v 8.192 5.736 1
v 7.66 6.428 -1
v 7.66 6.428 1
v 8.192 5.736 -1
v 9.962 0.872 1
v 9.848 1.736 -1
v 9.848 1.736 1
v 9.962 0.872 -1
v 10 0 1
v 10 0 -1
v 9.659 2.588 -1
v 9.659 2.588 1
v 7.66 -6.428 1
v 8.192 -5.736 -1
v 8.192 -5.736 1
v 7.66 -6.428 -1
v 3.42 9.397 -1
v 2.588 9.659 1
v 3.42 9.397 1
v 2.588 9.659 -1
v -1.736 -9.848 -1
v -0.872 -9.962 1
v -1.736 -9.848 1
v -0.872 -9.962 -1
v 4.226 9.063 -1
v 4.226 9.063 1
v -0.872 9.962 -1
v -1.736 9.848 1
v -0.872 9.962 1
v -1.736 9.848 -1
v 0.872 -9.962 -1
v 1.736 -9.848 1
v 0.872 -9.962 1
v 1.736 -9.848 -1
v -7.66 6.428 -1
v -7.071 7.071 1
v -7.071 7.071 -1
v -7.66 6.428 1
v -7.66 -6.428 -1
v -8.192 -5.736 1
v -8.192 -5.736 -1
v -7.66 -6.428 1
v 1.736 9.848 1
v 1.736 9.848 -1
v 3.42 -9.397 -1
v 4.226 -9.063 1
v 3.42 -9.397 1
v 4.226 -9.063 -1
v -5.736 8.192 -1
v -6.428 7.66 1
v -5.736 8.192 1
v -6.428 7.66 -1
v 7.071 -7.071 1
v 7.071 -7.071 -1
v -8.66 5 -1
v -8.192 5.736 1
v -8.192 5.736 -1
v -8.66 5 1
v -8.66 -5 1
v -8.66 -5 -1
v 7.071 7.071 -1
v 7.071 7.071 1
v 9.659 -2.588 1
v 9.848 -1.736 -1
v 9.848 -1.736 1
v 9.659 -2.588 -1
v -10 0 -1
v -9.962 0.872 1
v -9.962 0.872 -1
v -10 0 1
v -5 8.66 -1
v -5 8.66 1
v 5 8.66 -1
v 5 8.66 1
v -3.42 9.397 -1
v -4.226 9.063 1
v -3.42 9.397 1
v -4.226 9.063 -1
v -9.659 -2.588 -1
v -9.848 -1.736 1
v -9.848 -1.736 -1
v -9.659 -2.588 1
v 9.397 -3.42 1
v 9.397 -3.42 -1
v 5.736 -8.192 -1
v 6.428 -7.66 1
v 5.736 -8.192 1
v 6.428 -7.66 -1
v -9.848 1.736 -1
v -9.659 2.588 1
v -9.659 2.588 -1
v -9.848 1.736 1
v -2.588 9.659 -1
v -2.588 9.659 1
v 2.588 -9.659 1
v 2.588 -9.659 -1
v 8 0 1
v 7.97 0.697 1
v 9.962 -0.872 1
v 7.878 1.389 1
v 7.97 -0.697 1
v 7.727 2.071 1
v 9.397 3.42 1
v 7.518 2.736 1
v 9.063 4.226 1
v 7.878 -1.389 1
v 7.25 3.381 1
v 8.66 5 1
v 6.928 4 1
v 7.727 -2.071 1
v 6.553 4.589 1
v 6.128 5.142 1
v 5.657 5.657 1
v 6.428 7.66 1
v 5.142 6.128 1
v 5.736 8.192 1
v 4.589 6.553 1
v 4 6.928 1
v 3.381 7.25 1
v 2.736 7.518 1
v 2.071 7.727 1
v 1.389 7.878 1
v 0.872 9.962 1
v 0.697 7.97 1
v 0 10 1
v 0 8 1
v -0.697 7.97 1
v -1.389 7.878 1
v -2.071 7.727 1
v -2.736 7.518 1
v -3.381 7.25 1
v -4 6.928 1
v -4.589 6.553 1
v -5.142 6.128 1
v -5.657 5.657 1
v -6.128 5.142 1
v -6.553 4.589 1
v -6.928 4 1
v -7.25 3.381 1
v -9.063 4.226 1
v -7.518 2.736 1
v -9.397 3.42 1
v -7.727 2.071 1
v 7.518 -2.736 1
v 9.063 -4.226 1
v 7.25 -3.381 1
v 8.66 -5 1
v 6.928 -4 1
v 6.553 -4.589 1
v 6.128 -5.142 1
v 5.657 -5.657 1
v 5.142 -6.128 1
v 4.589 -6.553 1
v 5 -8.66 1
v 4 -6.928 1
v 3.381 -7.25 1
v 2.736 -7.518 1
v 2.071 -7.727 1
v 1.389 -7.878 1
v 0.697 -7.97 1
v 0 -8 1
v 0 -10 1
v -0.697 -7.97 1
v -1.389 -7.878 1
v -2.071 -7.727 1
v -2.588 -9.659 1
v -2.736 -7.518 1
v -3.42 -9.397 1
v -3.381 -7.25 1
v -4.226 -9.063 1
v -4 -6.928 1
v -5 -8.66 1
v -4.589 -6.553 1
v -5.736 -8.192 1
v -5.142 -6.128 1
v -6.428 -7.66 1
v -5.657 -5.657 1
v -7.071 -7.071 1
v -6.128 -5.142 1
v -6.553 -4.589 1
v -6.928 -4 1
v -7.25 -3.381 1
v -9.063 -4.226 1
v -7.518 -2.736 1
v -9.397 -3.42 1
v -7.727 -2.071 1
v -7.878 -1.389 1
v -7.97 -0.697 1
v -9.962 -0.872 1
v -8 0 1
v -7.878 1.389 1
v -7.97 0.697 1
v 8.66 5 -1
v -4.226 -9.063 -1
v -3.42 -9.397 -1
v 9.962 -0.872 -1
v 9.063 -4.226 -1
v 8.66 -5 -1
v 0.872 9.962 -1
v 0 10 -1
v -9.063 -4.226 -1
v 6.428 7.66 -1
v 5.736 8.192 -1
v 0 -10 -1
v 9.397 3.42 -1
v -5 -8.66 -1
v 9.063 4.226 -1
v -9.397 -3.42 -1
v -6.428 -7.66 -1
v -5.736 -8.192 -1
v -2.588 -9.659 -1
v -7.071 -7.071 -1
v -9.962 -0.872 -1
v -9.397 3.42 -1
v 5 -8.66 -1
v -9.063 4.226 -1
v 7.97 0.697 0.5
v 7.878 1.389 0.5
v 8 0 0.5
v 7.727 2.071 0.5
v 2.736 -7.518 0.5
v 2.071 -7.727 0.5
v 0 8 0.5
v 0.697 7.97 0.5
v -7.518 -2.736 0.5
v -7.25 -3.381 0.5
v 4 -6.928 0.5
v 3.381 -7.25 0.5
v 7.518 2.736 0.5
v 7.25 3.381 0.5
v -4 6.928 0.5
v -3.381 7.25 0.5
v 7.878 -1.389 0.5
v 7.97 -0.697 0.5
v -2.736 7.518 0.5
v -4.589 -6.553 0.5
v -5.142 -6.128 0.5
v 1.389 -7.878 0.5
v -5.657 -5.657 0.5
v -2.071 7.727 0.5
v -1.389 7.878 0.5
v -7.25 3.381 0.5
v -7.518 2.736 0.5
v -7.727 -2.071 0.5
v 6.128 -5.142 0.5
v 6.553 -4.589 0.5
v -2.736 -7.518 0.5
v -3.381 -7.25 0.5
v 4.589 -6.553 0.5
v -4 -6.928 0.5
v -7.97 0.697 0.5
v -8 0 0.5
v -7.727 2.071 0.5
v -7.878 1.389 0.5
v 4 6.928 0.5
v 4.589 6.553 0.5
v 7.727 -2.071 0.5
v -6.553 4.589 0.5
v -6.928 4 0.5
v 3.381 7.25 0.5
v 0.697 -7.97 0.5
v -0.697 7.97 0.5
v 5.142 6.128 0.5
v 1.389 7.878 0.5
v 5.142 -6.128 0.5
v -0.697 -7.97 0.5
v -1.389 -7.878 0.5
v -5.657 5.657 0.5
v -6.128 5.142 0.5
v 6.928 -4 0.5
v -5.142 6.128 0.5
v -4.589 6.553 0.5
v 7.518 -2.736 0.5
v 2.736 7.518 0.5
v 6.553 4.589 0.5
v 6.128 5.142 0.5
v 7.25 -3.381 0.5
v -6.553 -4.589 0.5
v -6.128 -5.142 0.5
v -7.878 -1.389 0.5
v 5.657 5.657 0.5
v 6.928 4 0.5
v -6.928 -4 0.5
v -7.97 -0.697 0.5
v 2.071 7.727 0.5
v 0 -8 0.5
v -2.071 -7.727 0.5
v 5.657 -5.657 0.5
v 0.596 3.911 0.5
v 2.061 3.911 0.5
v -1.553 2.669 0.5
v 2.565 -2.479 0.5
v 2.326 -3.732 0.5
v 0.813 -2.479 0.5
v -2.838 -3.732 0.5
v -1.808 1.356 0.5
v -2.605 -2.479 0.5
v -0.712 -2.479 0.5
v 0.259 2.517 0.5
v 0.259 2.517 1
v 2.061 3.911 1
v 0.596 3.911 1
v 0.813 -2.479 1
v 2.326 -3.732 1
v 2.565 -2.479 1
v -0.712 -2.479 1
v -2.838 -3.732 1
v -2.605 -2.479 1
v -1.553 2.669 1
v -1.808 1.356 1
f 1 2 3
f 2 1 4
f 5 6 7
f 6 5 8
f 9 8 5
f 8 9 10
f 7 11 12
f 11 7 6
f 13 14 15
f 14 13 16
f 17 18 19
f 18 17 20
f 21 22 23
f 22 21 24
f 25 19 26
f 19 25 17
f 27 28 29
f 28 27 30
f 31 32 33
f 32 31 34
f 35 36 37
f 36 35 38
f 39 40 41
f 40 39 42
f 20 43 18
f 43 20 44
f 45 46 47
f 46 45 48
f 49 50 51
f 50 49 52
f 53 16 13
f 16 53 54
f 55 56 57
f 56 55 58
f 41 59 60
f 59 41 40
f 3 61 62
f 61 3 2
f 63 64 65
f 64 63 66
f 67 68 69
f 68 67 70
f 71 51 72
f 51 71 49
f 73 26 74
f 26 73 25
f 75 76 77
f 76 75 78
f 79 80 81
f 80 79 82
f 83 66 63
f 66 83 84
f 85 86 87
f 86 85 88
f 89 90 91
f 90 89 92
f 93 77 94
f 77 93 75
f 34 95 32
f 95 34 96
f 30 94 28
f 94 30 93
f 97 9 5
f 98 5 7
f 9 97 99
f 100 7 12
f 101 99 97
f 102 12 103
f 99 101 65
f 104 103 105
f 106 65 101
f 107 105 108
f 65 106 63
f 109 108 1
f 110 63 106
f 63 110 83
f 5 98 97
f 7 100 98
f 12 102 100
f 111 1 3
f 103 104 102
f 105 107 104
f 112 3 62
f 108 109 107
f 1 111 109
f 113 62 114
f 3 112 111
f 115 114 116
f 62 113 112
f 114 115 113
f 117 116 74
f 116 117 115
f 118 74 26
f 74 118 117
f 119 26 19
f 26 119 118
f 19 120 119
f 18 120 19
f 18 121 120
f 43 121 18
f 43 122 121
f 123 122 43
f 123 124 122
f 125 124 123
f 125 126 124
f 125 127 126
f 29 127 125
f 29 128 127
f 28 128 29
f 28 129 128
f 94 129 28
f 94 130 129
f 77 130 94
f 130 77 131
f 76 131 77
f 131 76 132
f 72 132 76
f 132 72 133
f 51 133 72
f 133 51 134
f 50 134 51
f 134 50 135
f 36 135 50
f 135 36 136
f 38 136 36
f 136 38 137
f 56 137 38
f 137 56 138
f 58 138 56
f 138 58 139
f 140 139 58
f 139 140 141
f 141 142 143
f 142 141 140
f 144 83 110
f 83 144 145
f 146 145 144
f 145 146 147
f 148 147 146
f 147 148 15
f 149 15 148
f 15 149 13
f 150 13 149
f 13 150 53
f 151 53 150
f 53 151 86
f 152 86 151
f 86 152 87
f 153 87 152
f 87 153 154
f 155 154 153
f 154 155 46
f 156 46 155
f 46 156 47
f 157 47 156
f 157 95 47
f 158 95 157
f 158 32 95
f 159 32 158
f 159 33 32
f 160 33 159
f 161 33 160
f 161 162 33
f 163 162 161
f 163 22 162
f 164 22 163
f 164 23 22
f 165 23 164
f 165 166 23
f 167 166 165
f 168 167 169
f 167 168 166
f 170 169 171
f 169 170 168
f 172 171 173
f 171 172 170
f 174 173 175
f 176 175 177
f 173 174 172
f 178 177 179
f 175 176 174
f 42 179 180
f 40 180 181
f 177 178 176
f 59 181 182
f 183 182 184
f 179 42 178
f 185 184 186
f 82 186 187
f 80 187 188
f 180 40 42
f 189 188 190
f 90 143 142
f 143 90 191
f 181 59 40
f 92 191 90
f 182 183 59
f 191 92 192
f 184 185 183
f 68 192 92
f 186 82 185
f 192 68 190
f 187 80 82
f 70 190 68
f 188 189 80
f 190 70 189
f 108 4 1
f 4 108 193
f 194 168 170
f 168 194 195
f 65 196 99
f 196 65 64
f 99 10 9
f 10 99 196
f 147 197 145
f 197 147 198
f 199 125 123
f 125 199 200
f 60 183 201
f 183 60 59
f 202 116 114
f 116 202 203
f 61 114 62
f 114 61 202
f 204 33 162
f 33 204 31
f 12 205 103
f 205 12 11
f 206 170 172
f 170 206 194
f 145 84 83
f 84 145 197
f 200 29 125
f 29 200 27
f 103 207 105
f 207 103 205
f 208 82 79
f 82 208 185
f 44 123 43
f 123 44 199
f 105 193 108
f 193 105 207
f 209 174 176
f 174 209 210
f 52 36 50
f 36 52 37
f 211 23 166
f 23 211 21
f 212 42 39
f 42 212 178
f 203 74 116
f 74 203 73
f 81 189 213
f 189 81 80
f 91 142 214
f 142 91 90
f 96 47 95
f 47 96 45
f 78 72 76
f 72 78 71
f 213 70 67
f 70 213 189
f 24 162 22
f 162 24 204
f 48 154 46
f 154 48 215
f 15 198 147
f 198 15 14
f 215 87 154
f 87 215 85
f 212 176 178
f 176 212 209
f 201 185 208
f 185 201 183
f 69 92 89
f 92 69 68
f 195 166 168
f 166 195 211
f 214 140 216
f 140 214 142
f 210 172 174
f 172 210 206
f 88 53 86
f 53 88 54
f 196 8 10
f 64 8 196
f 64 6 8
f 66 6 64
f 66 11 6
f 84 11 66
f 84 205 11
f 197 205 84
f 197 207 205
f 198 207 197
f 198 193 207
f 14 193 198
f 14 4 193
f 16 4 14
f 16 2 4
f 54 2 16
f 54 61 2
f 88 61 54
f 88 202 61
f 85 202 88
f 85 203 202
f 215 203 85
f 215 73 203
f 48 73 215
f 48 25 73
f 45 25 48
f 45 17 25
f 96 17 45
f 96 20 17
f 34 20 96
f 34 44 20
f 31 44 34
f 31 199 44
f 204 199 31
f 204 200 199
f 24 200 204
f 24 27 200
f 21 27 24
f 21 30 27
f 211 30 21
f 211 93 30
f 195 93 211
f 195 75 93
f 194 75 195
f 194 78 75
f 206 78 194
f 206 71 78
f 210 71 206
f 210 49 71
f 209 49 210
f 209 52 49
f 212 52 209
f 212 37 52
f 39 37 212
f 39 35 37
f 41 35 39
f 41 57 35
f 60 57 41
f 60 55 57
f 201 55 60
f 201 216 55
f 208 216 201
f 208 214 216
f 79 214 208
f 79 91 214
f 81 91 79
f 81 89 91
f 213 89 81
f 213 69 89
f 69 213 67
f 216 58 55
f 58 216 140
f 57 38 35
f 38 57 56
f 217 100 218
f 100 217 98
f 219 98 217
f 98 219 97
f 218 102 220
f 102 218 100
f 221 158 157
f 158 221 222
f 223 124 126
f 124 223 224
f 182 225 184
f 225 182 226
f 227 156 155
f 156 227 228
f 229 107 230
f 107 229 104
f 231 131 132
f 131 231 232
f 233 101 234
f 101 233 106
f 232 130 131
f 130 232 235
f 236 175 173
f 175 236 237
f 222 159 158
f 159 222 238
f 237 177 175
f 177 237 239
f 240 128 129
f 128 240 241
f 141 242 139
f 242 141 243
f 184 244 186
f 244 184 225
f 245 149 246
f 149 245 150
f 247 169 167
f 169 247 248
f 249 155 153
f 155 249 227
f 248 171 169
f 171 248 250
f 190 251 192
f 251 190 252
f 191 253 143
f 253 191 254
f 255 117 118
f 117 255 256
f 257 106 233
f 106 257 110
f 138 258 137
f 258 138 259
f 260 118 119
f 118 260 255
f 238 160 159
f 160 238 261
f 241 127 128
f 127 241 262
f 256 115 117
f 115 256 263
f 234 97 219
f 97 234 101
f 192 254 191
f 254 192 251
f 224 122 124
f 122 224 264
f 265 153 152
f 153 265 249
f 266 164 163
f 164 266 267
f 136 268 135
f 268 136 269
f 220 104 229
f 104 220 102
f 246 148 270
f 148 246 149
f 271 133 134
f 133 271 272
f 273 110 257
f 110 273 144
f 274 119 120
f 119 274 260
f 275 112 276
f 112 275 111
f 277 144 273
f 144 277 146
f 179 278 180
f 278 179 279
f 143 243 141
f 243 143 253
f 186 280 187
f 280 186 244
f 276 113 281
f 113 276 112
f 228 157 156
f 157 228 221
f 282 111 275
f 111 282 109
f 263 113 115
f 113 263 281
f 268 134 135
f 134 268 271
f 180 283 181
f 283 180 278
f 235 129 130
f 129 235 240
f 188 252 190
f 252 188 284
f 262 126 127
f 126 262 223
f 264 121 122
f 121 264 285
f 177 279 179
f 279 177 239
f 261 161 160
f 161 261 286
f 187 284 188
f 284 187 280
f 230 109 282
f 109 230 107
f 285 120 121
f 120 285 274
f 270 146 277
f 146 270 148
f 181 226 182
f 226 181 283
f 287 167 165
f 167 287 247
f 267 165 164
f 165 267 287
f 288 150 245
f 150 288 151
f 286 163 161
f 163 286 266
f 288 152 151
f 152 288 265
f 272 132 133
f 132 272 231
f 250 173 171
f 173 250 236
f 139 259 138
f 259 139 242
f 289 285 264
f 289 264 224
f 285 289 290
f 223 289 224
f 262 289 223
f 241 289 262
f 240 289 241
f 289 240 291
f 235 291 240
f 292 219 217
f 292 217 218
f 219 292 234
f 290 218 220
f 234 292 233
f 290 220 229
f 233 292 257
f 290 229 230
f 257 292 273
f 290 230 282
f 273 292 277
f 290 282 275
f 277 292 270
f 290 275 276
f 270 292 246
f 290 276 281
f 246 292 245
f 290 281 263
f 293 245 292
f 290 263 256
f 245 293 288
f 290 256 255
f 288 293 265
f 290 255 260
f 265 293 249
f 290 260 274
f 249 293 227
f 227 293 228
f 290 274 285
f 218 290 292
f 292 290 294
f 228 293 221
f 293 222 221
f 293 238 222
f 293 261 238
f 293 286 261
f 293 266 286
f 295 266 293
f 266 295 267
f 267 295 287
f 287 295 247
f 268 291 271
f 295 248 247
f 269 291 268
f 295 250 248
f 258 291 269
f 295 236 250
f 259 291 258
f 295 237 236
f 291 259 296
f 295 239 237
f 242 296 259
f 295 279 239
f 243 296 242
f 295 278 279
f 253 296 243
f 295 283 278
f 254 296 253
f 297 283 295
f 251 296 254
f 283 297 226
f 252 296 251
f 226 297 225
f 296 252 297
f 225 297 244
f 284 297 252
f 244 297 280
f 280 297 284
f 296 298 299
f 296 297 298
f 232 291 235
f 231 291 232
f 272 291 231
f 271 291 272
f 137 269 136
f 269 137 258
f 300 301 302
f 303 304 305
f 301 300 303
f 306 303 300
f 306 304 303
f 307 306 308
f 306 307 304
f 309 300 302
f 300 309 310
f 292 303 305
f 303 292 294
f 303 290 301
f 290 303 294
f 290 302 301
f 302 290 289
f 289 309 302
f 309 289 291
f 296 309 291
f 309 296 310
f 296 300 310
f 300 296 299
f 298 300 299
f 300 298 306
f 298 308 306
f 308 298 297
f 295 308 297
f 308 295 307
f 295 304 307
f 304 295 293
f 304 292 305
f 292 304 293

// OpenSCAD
$fn = 72;

height = 2;
radius = 10;
thickness = 2;
depth = 0.5;
font = "Liberation Sans:style=Bold Italic";
size = 8;
singleSided = true;

text = "1";

difference() {
    cylinder(h=height, r1=radius, r2=radius, center=true);
    translate([0, 0, (height - depth)/2]) cylinder(h=depth, r1=radius-thickness, r2=radius-thickness, center=true);
    if (singleSided == false) {
        translate([0, 0, -(height - depth)/2]) cylinder(h=depth, r1=radius-thickness, r2=radius-thickness, center=true);
    }
}

linear_extrude(height / 2) text(text=text, font=font, size=size, valign="center", halign="center");
rotate([180, 0, 0]) linear_extrude(height/2) text(text=text, font=font, size=size, valign="center", halign="center");
